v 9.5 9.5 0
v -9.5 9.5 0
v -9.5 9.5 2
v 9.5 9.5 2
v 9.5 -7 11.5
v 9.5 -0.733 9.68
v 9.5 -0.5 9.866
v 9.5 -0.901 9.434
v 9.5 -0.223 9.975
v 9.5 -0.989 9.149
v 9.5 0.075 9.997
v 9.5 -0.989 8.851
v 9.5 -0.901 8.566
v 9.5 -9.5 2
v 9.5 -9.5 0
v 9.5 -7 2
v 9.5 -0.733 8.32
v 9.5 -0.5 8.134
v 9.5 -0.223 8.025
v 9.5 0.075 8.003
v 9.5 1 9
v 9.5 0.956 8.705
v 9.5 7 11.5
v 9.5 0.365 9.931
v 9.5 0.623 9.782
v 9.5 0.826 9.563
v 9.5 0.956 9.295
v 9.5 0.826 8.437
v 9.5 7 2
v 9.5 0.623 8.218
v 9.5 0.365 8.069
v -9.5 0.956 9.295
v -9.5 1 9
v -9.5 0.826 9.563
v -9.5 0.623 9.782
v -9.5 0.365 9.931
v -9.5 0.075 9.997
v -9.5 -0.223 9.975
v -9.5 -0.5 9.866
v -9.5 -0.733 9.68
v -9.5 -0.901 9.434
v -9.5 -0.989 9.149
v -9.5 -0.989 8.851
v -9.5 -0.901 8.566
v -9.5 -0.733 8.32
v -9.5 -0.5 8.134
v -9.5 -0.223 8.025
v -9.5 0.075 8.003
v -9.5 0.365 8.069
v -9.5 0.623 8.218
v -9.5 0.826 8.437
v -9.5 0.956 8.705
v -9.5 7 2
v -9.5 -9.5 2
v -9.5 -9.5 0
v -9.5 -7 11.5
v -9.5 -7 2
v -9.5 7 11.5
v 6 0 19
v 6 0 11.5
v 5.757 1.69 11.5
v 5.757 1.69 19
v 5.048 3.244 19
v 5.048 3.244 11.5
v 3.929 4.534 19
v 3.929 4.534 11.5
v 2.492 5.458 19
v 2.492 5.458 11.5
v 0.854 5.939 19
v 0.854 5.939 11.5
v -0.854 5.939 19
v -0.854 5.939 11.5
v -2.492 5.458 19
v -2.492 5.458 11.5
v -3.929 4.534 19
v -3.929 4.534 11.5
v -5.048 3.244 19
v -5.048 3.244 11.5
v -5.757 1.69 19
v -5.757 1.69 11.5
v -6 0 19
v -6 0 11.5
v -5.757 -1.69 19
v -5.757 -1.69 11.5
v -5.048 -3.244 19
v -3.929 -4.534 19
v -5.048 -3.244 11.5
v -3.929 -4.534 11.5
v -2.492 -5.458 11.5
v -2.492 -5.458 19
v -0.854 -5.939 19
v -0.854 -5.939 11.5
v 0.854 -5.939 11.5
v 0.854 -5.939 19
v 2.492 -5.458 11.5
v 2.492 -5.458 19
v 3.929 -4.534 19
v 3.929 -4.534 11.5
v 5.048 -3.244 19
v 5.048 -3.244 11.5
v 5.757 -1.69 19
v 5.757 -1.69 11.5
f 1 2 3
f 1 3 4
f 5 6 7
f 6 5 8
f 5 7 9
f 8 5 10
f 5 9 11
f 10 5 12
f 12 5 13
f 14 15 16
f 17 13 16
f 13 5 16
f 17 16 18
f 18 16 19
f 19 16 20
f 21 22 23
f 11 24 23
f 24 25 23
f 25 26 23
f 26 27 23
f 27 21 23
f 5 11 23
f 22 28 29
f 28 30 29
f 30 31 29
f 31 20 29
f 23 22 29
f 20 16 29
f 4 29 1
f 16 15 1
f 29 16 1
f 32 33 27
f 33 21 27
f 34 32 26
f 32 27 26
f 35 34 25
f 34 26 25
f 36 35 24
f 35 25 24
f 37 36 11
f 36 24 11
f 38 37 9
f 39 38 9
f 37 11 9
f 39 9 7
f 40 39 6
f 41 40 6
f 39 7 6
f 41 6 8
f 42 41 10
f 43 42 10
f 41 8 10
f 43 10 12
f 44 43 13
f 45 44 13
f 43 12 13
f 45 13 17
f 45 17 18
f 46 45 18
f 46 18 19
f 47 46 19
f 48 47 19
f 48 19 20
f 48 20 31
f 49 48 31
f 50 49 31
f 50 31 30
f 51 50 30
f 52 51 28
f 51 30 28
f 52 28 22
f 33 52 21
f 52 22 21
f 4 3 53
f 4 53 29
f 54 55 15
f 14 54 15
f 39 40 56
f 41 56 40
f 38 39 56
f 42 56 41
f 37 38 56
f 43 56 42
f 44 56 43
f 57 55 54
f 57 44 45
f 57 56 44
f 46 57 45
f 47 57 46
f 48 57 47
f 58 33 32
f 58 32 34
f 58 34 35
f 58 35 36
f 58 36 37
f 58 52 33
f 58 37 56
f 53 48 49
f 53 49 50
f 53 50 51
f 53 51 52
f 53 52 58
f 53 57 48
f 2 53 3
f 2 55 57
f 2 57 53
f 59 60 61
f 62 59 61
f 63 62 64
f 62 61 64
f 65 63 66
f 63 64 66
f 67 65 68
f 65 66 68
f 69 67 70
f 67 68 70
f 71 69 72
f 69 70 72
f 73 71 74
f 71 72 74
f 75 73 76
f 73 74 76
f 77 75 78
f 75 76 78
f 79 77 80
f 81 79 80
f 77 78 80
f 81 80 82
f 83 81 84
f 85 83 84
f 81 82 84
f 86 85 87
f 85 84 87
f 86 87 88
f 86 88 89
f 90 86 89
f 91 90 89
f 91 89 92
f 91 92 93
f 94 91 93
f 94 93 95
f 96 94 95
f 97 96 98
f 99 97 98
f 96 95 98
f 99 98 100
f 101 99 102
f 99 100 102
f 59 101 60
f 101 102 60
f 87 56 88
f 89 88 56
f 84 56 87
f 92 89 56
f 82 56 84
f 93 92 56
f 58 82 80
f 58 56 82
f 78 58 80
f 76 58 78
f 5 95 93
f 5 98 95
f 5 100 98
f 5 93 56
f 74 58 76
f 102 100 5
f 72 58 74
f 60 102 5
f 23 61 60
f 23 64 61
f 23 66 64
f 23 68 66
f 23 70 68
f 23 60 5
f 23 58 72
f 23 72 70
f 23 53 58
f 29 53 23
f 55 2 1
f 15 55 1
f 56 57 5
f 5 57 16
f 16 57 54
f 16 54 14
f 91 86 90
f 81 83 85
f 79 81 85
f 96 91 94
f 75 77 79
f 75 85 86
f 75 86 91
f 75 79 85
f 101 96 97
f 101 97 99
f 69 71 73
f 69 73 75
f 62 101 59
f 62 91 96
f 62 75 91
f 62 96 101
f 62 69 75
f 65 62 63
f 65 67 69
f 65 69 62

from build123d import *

# Parameters (mm, degrees)
F0_W          = 19
F0_H          = 19
F3_DEPTH      = 2
F4_START      = 2
F2_W          = 19
F2_H          = 14
F4_DEPTH      = 9.5
F5_START      = 11.5
F1_R          = 6
F5_DEPTH      = 7.5
F6_R          = 1
F7_DEPTH      = 25
F7_DEPTH_BACK = 25


with BuildPart() as f3:
    # F0 (on Top) → F3 (new body)
    with BuildSketch(Plane.XY):
        Rectangle(F0_W, F0_H)
    extrude(amount=F3_DEPTH)

    # F2 (on Top) → F4 (join)
    with BuildSketch(Plane.XY.offset(F4_START)):
        Rectangle(F2_W, F2_H)
    extrude(amount=F4_DEPTH)

    # F1 (on Top) → F5 (join)
    with BuildSketch(Plane.XY.offset(F5_START)):
        Circle(F1_R)
    extrude(amount=F5_DEPTH)

    # F6 (on Right) → F7 (cut, two sides)
    with BuildSketch(Plane.YZ) as f7_sk:
        with Locations((0, 9)):
            Circle(F6_R)
    extrude(amount=-F7_DEPTH, mode=Mode.SUBTRACT)
    extrude(f7_sk.sketch, amount=F7_DEPTH_BACK, mode=Mode.SUBTRACT)


solid = f3.part
